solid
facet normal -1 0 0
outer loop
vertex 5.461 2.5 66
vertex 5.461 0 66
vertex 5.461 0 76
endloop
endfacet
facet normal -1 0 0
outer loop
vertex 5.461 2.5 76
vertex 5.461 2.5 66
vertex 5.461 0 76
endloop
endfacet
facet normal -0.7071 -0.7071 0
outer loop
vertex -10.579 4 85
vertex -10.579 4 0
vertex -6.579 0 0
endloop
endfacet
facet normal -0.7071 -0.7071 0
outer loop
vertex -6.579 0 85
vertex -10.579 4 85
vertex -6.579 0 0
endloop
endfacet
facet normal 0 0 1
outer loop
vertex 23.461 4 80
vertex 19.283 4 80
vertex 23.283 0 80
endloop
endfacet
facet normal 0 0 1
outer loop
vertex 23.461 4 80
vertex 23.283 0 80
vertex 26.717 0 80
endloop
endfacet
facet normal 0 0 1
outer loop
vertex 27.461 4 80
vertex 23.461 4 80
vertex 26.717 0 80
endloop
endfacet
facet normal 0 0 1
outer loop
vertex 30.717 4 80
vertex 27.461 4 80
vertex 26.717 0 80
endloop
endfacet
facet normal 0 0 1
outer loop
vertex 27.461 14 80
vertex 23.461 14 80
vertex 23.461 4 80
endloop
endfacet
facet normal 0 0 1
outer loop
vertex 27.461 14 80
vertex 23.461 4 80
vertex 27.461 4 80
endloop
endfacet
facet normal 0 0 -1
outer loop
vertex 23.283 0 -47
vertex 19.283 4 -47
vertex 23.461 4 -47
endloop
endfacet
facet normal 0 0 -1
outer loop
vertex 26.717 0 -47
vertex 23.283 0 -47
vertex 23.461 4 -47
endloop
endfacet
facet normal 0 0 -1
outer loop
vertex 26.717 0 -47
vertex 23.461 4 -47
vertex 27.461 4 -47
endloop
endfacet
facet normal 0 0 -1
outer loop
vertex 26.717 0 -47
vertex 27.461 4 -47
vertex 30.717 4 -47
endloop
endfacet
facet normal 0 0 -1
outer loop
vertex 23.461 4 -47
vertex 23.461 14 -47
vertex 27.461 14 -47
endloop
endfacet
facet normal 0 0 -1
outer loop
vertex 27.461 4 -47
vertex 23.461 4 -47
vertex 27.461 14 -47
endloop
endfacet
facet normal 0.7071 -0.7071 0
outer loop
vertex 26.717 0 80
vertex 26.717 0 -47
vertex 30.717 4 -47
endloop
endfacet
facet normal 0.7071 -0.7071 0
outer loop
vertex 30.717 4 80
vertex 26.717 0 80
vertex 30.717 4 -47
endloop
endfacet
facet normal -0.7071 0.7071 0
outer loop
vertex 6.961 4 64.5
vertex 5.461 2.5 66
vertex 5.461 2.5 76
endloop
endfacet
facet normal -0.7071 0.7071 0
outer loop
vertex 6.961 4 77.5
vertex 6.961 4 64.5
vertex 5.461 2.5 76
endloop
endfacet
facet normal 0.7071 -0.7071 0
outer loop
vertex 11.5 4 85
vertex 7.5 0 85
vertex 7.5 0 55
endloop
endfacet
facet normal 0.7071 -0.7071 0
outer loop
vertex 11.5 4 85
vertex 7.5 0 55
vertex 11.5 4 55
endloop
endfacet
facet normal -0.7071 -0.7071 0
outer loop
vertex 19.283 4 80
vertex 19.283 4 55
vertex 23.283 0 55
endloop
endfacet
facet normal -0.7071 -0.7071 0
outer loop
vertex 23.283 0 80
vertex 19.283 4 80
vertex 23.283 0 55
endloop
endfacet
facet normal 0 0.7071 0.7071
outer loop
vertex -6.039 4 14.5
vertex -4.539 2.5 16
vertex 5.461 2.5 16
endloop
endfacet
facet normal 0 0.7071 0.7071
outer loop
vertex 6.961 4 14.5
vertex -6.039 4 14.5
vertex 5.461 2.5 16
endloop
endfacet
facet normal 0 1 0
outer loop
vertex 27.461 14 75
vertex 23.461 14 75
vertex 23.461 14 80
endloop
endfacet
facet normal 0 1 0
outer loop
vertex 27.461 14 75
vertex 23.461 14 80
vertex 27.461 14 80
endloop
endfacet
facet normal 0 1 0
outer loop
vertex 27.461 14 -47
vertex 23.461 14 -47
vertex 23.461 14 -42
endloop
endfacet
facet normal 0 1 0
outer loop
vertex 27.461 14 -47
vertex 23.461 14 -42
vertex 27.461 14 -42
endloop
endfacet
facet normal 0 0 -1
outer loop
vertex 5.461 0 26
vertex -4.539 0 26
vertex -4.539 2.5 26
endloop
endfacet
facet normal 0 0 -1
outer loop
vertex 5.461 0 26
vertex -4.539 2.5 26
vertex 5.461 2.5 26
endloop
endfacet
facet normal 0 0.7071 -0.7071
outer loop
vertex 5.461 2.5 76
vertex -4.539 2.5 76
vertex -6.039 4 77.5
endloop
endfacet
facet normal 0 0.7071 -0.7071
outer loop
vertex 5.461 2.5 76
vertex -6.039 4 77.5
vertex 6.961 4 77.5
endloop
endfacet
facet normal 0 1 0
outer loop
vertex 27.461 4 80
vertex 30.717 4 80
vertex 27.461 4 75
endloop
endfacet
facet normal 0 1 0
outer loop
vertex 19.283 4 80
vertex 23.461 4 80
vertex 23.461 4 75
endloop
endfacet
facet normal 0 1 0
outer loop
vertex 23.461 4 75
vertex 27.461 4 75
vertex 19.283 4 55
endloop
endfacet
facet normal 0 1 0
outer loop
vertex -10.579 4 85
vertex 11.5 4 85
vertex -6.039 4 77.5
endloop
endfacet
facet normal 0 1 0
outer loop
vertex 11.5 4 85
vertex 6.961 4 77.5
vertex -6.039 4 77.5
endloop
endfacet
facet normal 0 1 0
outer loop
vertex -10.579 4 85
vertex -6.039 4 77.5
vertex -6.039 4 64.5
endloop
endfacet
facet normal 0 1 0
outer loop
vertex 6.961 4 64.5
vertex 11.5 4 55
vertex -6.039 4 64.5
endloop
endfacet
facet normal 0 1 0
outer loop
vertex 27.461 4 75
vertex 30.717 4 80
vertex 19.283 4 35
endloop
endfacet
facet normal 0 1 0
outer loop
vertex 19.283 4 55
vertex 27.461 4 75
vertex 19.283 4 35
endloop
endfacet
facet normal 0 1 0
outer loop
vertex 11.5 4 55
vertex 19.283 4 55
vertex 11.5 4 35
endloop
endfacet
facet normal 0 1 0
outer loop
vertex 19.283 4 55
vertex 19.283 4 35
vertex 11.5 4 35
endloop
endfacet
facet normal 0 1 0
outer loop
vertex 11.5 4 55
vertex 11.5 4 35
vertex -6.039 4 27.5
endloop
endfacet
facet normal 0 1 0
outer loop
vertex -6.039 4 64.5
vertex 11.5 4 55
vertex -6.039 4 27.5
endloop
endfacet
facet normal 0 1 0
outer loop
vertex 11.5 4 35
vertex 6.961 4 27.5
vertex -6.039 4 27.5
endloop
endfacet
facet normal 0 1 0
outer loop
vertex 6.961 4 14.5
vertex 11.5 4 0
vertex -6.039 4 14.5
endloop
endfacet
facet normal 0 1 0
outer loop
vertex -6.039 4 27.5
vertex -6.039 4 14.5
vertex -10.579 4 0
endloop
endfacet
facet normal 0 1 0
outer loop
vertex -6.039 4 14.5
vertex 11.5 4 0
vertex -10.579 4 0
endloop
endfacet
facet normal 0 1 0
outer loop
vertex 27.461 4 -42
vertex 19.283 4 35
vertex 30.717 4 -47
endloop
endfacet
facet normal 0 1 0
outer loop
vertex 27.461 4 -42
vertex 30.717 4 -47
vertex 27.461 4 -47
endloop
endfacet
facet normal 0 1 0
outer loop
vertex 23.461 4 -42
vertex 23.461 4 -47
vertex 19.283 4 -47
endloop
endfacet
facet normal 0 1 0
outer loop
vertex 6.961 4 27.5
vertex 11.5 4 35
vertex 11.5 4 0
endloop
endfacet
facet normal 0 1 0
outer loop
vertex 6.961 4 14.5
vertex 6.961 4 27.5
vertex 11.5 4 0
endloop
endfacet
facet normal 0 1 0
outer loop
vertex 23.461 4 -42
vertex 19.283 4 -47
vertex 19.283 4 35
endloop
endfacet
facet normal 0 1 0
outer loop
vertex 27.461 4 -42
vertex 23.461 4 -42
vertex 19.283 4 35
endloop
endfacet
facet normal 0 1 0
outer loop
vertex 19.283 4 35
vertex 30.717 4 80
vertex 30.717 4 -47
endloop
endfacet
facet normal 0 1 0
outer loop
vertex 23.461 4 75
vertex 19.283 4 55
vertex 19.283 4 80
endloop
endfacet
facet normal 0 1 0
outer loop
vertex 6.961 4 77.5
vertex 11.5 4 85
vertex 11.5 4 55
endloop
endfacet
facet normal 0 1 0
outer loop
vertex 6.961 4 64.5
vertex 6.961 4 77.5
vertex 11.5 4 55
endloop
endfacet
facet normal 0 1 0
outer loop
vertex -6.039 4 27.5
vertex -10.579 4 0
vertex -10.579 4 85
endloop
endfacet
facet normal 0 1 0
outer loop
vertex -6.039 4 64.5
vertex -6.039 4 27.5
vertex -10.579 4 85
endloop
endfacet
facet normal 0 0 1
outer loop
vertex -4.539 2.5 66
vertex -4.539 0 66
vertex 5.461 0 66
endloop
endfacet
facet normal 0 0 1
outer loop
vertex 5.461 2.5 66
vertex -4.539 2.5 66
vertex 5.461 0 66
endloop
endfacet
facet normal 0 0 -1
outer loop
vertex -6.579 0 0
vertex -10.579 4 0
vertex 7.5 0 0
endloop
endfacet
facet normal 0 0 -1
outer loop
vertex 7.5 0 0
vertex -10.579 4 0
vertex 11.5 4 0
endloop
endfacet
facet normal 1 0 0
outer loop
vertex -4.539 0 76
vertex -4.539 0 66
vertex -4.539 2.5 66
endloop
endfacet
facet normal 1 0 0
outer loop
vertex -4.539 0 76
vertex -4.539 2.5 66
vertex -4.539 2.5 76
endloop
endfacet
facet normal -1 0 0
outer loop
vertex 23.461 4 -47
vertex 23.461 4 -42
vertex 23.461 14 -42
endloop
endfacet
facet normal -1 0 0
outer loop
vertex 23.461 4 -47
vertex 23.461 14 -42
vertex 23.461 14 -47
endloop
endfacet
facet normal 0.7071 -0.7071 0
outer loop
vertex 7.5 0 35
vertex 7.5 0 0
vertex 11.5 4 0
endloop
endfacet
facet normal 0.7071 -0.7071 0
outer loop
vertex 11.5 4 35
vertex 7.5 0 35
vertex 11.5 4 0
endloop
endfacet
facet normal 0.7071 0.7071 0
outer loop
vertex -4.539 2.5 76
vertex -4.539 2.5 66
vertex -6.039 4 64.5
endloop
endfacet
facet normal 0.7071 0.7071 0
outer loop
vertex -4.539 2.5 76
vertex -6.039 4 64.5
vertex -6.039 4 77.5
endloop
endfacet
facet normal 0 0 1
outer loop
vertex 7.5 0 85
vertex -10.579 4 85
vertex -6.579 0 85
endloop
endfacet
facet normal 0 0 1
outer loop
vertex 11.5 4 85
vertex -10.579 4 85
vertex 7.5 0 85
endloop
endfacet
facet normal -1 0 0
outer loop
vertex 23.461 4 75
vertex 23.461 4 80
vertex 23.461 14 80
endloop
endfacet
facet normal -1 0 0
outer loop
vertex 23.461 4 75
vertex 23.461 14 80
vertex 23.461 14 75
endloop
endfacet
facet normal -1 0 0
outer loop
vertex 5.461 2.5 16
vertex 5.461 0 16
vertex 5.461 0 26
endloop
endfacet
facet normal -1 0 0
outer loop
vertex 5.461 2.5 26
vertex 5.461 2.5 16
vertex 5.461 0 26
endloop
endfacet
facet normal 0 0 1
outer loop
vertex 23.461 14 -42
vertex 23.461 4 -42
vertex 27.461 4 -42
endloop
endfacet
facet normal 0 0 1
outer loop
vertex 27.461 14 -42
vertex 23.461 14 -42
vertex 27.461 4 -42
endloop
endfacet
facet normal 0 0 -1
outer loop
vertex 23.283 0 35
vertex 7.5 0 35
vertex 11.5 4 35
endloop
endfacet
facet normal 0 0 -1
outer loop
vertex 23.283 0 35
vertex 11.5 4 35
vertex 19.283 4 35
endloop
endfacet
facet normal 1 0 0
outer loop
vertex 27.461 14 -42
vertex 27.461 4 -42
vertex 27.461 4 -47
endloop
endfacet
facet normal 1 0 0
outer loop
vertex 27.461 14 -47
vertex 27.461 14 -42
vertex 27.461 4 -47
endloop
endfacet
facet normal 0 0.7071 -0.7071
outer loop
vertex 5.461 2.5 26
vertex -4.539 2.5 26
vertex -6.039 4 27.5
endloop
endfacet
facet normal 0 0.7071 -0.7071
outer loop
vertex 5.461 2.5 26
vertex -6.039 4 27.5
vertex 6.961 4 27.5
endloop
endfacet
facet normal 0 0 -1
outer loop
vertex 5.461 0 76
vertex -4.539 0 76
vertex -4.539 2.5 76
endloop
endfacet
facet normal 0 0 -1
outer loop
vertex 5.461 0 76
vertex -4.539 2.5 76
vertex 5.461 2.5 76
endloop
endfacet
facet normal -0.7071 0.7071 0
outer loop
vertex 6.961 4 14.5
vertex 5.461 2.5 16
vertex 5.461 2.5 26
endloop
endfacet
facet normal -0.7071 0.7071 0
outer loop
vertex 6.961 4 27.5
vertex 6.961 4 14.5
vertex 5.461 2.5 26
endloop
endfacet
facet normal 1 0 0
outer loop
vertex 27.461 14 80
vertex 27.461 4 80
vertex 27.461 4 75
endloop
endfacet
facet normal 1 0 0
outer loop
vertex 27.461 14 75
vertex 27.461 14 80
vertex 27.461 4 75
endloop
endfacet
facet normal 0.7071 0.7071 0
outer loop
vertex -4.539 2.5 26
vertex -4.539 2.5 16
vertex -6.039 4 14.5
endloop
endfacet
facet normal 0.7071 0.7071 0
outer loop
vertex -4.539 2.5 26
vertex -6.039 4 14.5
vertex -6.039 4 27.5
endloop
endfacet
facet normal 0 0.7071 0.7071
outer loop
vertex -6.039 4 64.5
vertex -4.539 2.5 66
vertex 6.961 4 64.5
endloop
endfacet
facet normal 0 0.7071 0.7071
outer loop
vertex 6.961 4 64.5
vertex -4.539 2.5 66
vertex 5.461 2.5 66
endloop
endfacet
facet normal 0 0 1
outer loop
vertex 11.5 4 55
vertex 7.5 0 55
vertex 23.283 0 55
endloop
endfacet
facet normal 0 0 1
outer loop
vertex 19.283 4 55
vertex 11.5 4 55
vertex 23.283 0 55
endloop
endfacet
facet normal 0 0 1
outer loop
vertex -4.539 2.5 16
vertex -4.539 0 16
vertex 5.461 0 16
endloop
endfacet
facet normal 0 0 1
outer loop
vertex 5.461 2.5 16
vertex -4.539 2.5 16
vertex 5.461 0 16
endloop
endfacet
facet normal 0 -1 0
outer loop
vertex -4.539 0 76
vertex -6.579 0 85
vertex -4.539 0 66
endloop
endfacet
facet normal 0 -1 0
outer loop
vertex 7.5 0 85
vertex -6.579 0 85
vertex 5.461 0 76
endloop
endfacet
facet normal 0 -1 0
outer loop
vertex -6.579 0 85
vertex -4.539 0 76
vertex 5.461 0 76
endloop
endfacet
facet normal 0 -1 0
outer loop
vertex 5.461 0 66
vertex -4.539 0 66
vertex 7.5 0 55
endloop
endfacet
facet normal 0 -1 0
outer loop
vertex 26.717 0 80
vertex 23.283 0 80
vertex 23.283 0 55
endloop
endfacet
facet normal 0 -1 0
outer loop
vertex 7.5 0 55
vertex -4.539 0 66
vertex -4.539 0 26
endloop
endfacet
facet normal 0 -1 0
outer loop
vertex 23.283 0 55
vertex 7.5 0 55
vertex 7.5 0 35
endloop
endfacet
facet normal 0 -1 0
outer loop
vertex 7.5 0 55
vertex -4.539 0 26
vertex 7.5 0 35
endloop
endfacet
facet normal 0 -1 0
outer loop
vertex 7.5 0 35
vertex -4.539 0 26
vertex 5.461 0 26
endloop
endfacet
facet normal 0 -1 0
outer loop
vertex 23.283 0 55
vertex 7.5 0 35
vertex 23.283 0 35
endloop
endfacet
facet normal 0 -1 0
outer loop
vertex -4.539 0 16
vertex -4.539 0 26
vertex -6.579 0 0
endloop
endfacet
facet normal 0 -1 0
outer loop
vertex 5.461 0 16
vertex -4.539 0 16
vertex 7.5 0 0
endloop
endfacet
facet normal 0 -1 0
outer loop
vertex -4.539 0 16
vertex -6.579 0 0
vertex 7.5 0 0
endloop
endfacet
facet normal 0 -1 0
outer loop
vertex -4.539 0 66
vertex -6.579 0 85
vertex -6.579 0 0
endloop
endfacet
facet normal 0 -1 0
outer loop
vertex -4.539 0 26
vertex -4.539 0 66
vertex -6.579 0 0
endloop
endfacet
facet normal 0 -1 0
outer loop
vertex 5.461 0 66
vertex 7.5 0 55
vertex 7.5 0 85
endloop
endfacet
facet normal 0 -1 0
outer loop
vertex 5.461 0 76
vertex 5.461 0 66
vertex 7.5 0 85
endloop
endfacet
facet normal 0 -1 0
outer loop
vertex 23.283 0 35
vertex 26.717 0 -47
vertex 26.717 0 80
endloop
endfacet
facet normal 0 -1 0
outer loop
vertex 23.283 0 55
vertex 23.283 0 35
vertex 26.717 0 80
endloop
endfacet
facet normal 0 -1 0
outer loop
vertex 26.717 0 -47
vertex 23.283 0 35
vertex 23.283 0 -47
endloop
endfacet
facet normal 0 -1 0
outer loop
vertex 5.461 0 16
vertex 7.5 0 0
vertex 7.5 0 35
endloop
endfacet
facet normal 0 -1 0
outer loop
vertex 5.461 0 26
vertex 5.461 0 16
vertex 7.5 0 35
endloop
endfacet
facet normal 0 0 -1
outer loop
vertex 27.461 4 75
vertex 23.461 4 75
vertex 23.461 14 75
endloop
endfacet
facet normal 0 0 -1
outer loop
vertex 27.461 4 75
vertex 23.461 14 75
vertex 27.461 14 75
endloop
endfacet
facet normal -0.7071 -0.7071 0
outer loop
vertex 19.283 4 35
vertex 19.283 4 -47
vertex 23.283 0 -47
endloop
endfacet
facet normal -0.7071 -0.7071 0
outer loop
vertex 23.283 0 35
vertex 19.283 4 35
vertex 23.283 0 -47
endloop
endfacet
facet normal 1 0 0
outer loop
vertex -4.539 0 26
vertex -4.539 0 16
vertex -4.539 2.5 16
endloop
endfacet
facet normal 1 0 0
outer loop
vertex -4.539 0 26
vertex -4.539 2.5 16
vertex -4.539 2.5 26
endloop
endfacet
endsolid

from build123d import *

# Parameters (mm, degrees)
DODANIE_WYCI_GNI_CIE1_DEPTH      = 85
SZKIC2_W                         = 10
SZKIC2_H                         = 10
WYTNIJ_WYCI_GNI_CIE1_DEPTH       = 80
DODANIE_WYCI_GNI_CIE3_DEPTH      = 80
DODANIE_WYCI_GNI_CIE3_DEPTH_BACK = 47
SZKIC4_W                         = 15.782842712
SZKIC4_H                         = 20
DODANIE_WYCI_GNI_CIE4_DEPTH      = 4
SZKIC5_W                         = 4
SZKIC5_H                         = 5
DODANIE_WYCI_GNI_CIE5_DEPTH      = 10
SZKIC6_W                         = 4
SZKIC6_H                         = 5
DODANIE_WYCI_GNI_CIE6_DEPTH      = 10
SFAZOWANIE1_SIZE                 = 1.5


with BuildPart() as part:
    # Szkic1 → Dodanie-wyciągnięcie1 (new body)
    with BuildSketch(Plane.XY):
        Polygon((7.5, 0), (11.5, 4), (-10.578691808, 4), (-6.578691808, 0), align=None)
    extrude(amount=DODANIE_WYCI_GNI_CIE1_DEPTH)

    # Szkic2 → Wytnij-wyciągnięcie1 (cut)
    with BuildSketch(Plane.XZ):
        with Locations((0.460654096, 21)):
            Rectangle(SZKIC2_W, SZKIC2_H)
        with Locations((0.460654096, 71)):
            Rectangle(SZKIC2_W, SZKIC2_H)
    extrude(amount=-WYTNIJ_WYCI_GNI_CIE1_DEPTH, mode=Mode.SUBTRACT)



with BuildPart() as body_2:
    # Szkic1<4> → Dodanie-wyciągnięcie3 (new, two sides: drawn at the far end of the back side and taken through both)
    with BuildSketch(Plane.XY.offset(-DODANIE_WYCI_GNI_CIE3_DEPTH_BACK)):
        Polygon((19.282842712, 4), (23.282842712, 0), (26.717157288, 0), (30.717157288, 4), align=None)
    extrude(amount=DODANIE_WYCI_GNI_CIE3_DEPTH + DODANIE_WYCI_GNI_CIE3_DEPTH_BACK)


with BuildPart() as part_1:
    add(part.part)

    add(body_2.part)  # Dodanie-wyciągnięcie4 merges body 2
    # Szkic4 → Dodanie-wyciągnięcie4 (add)
    with BuildSketch(Plane.XZ):
        with Locations((15.391421356, 45)):
            Rectangle(SZKIC4_W, SZKIC4_H)
    extrude(amount=-DODANIE_WYCI_GNI_CIE4_DEPTH)

    # Szkic5 → Dodanie-wyciągnięcie5 (add)
    with BuildSketch(Plane(origin=(0, 4, 0), x_dir=(1, 0, 0), z_dir=(0, 1, 0))):
        with Locations((25.460654096, -77.5)):
            Rectangle(SZKIC5_W, SZKIC5_H)
    extrude(amount=DODANIE_WYCI_GNI_CIE5_DEPTH)

    # Szkic6 → Dodanie-wyciągnięcie6 (add)
    with BuildSketch(Plane(origin=(0, 4, 0), x_dir=(1, 0, 0), z_dir=(0, 1, 0))):
        with Locations((25.460654096, 44.5)):
            Rectangle(SZKIC6_W, SZKIC6_H)
    extrude(amount=DODANIE_WYCI_GNI_CIE6_DEPTH)

    # Sfazowanie1
    sfazowanie1_edges = [part_1.edges().sort_by_distance(p)[0] for p in [
        (0.460654096, 4, 76),
        (-4.539345904, 4, 71),
        (0.460654096, 4, 66),
        (5.460654096, 4, 71),
        (0.460654096, 4, 26),
        (-4.539345904, 4, 21),
        (0.460654096, 4, 16),
        (5.460654096, 4, 21),
    ]]
    chamfer(sfazowanie1_edges, length=SFAZOWANIE1_SIZE)


solid = part_1.part
